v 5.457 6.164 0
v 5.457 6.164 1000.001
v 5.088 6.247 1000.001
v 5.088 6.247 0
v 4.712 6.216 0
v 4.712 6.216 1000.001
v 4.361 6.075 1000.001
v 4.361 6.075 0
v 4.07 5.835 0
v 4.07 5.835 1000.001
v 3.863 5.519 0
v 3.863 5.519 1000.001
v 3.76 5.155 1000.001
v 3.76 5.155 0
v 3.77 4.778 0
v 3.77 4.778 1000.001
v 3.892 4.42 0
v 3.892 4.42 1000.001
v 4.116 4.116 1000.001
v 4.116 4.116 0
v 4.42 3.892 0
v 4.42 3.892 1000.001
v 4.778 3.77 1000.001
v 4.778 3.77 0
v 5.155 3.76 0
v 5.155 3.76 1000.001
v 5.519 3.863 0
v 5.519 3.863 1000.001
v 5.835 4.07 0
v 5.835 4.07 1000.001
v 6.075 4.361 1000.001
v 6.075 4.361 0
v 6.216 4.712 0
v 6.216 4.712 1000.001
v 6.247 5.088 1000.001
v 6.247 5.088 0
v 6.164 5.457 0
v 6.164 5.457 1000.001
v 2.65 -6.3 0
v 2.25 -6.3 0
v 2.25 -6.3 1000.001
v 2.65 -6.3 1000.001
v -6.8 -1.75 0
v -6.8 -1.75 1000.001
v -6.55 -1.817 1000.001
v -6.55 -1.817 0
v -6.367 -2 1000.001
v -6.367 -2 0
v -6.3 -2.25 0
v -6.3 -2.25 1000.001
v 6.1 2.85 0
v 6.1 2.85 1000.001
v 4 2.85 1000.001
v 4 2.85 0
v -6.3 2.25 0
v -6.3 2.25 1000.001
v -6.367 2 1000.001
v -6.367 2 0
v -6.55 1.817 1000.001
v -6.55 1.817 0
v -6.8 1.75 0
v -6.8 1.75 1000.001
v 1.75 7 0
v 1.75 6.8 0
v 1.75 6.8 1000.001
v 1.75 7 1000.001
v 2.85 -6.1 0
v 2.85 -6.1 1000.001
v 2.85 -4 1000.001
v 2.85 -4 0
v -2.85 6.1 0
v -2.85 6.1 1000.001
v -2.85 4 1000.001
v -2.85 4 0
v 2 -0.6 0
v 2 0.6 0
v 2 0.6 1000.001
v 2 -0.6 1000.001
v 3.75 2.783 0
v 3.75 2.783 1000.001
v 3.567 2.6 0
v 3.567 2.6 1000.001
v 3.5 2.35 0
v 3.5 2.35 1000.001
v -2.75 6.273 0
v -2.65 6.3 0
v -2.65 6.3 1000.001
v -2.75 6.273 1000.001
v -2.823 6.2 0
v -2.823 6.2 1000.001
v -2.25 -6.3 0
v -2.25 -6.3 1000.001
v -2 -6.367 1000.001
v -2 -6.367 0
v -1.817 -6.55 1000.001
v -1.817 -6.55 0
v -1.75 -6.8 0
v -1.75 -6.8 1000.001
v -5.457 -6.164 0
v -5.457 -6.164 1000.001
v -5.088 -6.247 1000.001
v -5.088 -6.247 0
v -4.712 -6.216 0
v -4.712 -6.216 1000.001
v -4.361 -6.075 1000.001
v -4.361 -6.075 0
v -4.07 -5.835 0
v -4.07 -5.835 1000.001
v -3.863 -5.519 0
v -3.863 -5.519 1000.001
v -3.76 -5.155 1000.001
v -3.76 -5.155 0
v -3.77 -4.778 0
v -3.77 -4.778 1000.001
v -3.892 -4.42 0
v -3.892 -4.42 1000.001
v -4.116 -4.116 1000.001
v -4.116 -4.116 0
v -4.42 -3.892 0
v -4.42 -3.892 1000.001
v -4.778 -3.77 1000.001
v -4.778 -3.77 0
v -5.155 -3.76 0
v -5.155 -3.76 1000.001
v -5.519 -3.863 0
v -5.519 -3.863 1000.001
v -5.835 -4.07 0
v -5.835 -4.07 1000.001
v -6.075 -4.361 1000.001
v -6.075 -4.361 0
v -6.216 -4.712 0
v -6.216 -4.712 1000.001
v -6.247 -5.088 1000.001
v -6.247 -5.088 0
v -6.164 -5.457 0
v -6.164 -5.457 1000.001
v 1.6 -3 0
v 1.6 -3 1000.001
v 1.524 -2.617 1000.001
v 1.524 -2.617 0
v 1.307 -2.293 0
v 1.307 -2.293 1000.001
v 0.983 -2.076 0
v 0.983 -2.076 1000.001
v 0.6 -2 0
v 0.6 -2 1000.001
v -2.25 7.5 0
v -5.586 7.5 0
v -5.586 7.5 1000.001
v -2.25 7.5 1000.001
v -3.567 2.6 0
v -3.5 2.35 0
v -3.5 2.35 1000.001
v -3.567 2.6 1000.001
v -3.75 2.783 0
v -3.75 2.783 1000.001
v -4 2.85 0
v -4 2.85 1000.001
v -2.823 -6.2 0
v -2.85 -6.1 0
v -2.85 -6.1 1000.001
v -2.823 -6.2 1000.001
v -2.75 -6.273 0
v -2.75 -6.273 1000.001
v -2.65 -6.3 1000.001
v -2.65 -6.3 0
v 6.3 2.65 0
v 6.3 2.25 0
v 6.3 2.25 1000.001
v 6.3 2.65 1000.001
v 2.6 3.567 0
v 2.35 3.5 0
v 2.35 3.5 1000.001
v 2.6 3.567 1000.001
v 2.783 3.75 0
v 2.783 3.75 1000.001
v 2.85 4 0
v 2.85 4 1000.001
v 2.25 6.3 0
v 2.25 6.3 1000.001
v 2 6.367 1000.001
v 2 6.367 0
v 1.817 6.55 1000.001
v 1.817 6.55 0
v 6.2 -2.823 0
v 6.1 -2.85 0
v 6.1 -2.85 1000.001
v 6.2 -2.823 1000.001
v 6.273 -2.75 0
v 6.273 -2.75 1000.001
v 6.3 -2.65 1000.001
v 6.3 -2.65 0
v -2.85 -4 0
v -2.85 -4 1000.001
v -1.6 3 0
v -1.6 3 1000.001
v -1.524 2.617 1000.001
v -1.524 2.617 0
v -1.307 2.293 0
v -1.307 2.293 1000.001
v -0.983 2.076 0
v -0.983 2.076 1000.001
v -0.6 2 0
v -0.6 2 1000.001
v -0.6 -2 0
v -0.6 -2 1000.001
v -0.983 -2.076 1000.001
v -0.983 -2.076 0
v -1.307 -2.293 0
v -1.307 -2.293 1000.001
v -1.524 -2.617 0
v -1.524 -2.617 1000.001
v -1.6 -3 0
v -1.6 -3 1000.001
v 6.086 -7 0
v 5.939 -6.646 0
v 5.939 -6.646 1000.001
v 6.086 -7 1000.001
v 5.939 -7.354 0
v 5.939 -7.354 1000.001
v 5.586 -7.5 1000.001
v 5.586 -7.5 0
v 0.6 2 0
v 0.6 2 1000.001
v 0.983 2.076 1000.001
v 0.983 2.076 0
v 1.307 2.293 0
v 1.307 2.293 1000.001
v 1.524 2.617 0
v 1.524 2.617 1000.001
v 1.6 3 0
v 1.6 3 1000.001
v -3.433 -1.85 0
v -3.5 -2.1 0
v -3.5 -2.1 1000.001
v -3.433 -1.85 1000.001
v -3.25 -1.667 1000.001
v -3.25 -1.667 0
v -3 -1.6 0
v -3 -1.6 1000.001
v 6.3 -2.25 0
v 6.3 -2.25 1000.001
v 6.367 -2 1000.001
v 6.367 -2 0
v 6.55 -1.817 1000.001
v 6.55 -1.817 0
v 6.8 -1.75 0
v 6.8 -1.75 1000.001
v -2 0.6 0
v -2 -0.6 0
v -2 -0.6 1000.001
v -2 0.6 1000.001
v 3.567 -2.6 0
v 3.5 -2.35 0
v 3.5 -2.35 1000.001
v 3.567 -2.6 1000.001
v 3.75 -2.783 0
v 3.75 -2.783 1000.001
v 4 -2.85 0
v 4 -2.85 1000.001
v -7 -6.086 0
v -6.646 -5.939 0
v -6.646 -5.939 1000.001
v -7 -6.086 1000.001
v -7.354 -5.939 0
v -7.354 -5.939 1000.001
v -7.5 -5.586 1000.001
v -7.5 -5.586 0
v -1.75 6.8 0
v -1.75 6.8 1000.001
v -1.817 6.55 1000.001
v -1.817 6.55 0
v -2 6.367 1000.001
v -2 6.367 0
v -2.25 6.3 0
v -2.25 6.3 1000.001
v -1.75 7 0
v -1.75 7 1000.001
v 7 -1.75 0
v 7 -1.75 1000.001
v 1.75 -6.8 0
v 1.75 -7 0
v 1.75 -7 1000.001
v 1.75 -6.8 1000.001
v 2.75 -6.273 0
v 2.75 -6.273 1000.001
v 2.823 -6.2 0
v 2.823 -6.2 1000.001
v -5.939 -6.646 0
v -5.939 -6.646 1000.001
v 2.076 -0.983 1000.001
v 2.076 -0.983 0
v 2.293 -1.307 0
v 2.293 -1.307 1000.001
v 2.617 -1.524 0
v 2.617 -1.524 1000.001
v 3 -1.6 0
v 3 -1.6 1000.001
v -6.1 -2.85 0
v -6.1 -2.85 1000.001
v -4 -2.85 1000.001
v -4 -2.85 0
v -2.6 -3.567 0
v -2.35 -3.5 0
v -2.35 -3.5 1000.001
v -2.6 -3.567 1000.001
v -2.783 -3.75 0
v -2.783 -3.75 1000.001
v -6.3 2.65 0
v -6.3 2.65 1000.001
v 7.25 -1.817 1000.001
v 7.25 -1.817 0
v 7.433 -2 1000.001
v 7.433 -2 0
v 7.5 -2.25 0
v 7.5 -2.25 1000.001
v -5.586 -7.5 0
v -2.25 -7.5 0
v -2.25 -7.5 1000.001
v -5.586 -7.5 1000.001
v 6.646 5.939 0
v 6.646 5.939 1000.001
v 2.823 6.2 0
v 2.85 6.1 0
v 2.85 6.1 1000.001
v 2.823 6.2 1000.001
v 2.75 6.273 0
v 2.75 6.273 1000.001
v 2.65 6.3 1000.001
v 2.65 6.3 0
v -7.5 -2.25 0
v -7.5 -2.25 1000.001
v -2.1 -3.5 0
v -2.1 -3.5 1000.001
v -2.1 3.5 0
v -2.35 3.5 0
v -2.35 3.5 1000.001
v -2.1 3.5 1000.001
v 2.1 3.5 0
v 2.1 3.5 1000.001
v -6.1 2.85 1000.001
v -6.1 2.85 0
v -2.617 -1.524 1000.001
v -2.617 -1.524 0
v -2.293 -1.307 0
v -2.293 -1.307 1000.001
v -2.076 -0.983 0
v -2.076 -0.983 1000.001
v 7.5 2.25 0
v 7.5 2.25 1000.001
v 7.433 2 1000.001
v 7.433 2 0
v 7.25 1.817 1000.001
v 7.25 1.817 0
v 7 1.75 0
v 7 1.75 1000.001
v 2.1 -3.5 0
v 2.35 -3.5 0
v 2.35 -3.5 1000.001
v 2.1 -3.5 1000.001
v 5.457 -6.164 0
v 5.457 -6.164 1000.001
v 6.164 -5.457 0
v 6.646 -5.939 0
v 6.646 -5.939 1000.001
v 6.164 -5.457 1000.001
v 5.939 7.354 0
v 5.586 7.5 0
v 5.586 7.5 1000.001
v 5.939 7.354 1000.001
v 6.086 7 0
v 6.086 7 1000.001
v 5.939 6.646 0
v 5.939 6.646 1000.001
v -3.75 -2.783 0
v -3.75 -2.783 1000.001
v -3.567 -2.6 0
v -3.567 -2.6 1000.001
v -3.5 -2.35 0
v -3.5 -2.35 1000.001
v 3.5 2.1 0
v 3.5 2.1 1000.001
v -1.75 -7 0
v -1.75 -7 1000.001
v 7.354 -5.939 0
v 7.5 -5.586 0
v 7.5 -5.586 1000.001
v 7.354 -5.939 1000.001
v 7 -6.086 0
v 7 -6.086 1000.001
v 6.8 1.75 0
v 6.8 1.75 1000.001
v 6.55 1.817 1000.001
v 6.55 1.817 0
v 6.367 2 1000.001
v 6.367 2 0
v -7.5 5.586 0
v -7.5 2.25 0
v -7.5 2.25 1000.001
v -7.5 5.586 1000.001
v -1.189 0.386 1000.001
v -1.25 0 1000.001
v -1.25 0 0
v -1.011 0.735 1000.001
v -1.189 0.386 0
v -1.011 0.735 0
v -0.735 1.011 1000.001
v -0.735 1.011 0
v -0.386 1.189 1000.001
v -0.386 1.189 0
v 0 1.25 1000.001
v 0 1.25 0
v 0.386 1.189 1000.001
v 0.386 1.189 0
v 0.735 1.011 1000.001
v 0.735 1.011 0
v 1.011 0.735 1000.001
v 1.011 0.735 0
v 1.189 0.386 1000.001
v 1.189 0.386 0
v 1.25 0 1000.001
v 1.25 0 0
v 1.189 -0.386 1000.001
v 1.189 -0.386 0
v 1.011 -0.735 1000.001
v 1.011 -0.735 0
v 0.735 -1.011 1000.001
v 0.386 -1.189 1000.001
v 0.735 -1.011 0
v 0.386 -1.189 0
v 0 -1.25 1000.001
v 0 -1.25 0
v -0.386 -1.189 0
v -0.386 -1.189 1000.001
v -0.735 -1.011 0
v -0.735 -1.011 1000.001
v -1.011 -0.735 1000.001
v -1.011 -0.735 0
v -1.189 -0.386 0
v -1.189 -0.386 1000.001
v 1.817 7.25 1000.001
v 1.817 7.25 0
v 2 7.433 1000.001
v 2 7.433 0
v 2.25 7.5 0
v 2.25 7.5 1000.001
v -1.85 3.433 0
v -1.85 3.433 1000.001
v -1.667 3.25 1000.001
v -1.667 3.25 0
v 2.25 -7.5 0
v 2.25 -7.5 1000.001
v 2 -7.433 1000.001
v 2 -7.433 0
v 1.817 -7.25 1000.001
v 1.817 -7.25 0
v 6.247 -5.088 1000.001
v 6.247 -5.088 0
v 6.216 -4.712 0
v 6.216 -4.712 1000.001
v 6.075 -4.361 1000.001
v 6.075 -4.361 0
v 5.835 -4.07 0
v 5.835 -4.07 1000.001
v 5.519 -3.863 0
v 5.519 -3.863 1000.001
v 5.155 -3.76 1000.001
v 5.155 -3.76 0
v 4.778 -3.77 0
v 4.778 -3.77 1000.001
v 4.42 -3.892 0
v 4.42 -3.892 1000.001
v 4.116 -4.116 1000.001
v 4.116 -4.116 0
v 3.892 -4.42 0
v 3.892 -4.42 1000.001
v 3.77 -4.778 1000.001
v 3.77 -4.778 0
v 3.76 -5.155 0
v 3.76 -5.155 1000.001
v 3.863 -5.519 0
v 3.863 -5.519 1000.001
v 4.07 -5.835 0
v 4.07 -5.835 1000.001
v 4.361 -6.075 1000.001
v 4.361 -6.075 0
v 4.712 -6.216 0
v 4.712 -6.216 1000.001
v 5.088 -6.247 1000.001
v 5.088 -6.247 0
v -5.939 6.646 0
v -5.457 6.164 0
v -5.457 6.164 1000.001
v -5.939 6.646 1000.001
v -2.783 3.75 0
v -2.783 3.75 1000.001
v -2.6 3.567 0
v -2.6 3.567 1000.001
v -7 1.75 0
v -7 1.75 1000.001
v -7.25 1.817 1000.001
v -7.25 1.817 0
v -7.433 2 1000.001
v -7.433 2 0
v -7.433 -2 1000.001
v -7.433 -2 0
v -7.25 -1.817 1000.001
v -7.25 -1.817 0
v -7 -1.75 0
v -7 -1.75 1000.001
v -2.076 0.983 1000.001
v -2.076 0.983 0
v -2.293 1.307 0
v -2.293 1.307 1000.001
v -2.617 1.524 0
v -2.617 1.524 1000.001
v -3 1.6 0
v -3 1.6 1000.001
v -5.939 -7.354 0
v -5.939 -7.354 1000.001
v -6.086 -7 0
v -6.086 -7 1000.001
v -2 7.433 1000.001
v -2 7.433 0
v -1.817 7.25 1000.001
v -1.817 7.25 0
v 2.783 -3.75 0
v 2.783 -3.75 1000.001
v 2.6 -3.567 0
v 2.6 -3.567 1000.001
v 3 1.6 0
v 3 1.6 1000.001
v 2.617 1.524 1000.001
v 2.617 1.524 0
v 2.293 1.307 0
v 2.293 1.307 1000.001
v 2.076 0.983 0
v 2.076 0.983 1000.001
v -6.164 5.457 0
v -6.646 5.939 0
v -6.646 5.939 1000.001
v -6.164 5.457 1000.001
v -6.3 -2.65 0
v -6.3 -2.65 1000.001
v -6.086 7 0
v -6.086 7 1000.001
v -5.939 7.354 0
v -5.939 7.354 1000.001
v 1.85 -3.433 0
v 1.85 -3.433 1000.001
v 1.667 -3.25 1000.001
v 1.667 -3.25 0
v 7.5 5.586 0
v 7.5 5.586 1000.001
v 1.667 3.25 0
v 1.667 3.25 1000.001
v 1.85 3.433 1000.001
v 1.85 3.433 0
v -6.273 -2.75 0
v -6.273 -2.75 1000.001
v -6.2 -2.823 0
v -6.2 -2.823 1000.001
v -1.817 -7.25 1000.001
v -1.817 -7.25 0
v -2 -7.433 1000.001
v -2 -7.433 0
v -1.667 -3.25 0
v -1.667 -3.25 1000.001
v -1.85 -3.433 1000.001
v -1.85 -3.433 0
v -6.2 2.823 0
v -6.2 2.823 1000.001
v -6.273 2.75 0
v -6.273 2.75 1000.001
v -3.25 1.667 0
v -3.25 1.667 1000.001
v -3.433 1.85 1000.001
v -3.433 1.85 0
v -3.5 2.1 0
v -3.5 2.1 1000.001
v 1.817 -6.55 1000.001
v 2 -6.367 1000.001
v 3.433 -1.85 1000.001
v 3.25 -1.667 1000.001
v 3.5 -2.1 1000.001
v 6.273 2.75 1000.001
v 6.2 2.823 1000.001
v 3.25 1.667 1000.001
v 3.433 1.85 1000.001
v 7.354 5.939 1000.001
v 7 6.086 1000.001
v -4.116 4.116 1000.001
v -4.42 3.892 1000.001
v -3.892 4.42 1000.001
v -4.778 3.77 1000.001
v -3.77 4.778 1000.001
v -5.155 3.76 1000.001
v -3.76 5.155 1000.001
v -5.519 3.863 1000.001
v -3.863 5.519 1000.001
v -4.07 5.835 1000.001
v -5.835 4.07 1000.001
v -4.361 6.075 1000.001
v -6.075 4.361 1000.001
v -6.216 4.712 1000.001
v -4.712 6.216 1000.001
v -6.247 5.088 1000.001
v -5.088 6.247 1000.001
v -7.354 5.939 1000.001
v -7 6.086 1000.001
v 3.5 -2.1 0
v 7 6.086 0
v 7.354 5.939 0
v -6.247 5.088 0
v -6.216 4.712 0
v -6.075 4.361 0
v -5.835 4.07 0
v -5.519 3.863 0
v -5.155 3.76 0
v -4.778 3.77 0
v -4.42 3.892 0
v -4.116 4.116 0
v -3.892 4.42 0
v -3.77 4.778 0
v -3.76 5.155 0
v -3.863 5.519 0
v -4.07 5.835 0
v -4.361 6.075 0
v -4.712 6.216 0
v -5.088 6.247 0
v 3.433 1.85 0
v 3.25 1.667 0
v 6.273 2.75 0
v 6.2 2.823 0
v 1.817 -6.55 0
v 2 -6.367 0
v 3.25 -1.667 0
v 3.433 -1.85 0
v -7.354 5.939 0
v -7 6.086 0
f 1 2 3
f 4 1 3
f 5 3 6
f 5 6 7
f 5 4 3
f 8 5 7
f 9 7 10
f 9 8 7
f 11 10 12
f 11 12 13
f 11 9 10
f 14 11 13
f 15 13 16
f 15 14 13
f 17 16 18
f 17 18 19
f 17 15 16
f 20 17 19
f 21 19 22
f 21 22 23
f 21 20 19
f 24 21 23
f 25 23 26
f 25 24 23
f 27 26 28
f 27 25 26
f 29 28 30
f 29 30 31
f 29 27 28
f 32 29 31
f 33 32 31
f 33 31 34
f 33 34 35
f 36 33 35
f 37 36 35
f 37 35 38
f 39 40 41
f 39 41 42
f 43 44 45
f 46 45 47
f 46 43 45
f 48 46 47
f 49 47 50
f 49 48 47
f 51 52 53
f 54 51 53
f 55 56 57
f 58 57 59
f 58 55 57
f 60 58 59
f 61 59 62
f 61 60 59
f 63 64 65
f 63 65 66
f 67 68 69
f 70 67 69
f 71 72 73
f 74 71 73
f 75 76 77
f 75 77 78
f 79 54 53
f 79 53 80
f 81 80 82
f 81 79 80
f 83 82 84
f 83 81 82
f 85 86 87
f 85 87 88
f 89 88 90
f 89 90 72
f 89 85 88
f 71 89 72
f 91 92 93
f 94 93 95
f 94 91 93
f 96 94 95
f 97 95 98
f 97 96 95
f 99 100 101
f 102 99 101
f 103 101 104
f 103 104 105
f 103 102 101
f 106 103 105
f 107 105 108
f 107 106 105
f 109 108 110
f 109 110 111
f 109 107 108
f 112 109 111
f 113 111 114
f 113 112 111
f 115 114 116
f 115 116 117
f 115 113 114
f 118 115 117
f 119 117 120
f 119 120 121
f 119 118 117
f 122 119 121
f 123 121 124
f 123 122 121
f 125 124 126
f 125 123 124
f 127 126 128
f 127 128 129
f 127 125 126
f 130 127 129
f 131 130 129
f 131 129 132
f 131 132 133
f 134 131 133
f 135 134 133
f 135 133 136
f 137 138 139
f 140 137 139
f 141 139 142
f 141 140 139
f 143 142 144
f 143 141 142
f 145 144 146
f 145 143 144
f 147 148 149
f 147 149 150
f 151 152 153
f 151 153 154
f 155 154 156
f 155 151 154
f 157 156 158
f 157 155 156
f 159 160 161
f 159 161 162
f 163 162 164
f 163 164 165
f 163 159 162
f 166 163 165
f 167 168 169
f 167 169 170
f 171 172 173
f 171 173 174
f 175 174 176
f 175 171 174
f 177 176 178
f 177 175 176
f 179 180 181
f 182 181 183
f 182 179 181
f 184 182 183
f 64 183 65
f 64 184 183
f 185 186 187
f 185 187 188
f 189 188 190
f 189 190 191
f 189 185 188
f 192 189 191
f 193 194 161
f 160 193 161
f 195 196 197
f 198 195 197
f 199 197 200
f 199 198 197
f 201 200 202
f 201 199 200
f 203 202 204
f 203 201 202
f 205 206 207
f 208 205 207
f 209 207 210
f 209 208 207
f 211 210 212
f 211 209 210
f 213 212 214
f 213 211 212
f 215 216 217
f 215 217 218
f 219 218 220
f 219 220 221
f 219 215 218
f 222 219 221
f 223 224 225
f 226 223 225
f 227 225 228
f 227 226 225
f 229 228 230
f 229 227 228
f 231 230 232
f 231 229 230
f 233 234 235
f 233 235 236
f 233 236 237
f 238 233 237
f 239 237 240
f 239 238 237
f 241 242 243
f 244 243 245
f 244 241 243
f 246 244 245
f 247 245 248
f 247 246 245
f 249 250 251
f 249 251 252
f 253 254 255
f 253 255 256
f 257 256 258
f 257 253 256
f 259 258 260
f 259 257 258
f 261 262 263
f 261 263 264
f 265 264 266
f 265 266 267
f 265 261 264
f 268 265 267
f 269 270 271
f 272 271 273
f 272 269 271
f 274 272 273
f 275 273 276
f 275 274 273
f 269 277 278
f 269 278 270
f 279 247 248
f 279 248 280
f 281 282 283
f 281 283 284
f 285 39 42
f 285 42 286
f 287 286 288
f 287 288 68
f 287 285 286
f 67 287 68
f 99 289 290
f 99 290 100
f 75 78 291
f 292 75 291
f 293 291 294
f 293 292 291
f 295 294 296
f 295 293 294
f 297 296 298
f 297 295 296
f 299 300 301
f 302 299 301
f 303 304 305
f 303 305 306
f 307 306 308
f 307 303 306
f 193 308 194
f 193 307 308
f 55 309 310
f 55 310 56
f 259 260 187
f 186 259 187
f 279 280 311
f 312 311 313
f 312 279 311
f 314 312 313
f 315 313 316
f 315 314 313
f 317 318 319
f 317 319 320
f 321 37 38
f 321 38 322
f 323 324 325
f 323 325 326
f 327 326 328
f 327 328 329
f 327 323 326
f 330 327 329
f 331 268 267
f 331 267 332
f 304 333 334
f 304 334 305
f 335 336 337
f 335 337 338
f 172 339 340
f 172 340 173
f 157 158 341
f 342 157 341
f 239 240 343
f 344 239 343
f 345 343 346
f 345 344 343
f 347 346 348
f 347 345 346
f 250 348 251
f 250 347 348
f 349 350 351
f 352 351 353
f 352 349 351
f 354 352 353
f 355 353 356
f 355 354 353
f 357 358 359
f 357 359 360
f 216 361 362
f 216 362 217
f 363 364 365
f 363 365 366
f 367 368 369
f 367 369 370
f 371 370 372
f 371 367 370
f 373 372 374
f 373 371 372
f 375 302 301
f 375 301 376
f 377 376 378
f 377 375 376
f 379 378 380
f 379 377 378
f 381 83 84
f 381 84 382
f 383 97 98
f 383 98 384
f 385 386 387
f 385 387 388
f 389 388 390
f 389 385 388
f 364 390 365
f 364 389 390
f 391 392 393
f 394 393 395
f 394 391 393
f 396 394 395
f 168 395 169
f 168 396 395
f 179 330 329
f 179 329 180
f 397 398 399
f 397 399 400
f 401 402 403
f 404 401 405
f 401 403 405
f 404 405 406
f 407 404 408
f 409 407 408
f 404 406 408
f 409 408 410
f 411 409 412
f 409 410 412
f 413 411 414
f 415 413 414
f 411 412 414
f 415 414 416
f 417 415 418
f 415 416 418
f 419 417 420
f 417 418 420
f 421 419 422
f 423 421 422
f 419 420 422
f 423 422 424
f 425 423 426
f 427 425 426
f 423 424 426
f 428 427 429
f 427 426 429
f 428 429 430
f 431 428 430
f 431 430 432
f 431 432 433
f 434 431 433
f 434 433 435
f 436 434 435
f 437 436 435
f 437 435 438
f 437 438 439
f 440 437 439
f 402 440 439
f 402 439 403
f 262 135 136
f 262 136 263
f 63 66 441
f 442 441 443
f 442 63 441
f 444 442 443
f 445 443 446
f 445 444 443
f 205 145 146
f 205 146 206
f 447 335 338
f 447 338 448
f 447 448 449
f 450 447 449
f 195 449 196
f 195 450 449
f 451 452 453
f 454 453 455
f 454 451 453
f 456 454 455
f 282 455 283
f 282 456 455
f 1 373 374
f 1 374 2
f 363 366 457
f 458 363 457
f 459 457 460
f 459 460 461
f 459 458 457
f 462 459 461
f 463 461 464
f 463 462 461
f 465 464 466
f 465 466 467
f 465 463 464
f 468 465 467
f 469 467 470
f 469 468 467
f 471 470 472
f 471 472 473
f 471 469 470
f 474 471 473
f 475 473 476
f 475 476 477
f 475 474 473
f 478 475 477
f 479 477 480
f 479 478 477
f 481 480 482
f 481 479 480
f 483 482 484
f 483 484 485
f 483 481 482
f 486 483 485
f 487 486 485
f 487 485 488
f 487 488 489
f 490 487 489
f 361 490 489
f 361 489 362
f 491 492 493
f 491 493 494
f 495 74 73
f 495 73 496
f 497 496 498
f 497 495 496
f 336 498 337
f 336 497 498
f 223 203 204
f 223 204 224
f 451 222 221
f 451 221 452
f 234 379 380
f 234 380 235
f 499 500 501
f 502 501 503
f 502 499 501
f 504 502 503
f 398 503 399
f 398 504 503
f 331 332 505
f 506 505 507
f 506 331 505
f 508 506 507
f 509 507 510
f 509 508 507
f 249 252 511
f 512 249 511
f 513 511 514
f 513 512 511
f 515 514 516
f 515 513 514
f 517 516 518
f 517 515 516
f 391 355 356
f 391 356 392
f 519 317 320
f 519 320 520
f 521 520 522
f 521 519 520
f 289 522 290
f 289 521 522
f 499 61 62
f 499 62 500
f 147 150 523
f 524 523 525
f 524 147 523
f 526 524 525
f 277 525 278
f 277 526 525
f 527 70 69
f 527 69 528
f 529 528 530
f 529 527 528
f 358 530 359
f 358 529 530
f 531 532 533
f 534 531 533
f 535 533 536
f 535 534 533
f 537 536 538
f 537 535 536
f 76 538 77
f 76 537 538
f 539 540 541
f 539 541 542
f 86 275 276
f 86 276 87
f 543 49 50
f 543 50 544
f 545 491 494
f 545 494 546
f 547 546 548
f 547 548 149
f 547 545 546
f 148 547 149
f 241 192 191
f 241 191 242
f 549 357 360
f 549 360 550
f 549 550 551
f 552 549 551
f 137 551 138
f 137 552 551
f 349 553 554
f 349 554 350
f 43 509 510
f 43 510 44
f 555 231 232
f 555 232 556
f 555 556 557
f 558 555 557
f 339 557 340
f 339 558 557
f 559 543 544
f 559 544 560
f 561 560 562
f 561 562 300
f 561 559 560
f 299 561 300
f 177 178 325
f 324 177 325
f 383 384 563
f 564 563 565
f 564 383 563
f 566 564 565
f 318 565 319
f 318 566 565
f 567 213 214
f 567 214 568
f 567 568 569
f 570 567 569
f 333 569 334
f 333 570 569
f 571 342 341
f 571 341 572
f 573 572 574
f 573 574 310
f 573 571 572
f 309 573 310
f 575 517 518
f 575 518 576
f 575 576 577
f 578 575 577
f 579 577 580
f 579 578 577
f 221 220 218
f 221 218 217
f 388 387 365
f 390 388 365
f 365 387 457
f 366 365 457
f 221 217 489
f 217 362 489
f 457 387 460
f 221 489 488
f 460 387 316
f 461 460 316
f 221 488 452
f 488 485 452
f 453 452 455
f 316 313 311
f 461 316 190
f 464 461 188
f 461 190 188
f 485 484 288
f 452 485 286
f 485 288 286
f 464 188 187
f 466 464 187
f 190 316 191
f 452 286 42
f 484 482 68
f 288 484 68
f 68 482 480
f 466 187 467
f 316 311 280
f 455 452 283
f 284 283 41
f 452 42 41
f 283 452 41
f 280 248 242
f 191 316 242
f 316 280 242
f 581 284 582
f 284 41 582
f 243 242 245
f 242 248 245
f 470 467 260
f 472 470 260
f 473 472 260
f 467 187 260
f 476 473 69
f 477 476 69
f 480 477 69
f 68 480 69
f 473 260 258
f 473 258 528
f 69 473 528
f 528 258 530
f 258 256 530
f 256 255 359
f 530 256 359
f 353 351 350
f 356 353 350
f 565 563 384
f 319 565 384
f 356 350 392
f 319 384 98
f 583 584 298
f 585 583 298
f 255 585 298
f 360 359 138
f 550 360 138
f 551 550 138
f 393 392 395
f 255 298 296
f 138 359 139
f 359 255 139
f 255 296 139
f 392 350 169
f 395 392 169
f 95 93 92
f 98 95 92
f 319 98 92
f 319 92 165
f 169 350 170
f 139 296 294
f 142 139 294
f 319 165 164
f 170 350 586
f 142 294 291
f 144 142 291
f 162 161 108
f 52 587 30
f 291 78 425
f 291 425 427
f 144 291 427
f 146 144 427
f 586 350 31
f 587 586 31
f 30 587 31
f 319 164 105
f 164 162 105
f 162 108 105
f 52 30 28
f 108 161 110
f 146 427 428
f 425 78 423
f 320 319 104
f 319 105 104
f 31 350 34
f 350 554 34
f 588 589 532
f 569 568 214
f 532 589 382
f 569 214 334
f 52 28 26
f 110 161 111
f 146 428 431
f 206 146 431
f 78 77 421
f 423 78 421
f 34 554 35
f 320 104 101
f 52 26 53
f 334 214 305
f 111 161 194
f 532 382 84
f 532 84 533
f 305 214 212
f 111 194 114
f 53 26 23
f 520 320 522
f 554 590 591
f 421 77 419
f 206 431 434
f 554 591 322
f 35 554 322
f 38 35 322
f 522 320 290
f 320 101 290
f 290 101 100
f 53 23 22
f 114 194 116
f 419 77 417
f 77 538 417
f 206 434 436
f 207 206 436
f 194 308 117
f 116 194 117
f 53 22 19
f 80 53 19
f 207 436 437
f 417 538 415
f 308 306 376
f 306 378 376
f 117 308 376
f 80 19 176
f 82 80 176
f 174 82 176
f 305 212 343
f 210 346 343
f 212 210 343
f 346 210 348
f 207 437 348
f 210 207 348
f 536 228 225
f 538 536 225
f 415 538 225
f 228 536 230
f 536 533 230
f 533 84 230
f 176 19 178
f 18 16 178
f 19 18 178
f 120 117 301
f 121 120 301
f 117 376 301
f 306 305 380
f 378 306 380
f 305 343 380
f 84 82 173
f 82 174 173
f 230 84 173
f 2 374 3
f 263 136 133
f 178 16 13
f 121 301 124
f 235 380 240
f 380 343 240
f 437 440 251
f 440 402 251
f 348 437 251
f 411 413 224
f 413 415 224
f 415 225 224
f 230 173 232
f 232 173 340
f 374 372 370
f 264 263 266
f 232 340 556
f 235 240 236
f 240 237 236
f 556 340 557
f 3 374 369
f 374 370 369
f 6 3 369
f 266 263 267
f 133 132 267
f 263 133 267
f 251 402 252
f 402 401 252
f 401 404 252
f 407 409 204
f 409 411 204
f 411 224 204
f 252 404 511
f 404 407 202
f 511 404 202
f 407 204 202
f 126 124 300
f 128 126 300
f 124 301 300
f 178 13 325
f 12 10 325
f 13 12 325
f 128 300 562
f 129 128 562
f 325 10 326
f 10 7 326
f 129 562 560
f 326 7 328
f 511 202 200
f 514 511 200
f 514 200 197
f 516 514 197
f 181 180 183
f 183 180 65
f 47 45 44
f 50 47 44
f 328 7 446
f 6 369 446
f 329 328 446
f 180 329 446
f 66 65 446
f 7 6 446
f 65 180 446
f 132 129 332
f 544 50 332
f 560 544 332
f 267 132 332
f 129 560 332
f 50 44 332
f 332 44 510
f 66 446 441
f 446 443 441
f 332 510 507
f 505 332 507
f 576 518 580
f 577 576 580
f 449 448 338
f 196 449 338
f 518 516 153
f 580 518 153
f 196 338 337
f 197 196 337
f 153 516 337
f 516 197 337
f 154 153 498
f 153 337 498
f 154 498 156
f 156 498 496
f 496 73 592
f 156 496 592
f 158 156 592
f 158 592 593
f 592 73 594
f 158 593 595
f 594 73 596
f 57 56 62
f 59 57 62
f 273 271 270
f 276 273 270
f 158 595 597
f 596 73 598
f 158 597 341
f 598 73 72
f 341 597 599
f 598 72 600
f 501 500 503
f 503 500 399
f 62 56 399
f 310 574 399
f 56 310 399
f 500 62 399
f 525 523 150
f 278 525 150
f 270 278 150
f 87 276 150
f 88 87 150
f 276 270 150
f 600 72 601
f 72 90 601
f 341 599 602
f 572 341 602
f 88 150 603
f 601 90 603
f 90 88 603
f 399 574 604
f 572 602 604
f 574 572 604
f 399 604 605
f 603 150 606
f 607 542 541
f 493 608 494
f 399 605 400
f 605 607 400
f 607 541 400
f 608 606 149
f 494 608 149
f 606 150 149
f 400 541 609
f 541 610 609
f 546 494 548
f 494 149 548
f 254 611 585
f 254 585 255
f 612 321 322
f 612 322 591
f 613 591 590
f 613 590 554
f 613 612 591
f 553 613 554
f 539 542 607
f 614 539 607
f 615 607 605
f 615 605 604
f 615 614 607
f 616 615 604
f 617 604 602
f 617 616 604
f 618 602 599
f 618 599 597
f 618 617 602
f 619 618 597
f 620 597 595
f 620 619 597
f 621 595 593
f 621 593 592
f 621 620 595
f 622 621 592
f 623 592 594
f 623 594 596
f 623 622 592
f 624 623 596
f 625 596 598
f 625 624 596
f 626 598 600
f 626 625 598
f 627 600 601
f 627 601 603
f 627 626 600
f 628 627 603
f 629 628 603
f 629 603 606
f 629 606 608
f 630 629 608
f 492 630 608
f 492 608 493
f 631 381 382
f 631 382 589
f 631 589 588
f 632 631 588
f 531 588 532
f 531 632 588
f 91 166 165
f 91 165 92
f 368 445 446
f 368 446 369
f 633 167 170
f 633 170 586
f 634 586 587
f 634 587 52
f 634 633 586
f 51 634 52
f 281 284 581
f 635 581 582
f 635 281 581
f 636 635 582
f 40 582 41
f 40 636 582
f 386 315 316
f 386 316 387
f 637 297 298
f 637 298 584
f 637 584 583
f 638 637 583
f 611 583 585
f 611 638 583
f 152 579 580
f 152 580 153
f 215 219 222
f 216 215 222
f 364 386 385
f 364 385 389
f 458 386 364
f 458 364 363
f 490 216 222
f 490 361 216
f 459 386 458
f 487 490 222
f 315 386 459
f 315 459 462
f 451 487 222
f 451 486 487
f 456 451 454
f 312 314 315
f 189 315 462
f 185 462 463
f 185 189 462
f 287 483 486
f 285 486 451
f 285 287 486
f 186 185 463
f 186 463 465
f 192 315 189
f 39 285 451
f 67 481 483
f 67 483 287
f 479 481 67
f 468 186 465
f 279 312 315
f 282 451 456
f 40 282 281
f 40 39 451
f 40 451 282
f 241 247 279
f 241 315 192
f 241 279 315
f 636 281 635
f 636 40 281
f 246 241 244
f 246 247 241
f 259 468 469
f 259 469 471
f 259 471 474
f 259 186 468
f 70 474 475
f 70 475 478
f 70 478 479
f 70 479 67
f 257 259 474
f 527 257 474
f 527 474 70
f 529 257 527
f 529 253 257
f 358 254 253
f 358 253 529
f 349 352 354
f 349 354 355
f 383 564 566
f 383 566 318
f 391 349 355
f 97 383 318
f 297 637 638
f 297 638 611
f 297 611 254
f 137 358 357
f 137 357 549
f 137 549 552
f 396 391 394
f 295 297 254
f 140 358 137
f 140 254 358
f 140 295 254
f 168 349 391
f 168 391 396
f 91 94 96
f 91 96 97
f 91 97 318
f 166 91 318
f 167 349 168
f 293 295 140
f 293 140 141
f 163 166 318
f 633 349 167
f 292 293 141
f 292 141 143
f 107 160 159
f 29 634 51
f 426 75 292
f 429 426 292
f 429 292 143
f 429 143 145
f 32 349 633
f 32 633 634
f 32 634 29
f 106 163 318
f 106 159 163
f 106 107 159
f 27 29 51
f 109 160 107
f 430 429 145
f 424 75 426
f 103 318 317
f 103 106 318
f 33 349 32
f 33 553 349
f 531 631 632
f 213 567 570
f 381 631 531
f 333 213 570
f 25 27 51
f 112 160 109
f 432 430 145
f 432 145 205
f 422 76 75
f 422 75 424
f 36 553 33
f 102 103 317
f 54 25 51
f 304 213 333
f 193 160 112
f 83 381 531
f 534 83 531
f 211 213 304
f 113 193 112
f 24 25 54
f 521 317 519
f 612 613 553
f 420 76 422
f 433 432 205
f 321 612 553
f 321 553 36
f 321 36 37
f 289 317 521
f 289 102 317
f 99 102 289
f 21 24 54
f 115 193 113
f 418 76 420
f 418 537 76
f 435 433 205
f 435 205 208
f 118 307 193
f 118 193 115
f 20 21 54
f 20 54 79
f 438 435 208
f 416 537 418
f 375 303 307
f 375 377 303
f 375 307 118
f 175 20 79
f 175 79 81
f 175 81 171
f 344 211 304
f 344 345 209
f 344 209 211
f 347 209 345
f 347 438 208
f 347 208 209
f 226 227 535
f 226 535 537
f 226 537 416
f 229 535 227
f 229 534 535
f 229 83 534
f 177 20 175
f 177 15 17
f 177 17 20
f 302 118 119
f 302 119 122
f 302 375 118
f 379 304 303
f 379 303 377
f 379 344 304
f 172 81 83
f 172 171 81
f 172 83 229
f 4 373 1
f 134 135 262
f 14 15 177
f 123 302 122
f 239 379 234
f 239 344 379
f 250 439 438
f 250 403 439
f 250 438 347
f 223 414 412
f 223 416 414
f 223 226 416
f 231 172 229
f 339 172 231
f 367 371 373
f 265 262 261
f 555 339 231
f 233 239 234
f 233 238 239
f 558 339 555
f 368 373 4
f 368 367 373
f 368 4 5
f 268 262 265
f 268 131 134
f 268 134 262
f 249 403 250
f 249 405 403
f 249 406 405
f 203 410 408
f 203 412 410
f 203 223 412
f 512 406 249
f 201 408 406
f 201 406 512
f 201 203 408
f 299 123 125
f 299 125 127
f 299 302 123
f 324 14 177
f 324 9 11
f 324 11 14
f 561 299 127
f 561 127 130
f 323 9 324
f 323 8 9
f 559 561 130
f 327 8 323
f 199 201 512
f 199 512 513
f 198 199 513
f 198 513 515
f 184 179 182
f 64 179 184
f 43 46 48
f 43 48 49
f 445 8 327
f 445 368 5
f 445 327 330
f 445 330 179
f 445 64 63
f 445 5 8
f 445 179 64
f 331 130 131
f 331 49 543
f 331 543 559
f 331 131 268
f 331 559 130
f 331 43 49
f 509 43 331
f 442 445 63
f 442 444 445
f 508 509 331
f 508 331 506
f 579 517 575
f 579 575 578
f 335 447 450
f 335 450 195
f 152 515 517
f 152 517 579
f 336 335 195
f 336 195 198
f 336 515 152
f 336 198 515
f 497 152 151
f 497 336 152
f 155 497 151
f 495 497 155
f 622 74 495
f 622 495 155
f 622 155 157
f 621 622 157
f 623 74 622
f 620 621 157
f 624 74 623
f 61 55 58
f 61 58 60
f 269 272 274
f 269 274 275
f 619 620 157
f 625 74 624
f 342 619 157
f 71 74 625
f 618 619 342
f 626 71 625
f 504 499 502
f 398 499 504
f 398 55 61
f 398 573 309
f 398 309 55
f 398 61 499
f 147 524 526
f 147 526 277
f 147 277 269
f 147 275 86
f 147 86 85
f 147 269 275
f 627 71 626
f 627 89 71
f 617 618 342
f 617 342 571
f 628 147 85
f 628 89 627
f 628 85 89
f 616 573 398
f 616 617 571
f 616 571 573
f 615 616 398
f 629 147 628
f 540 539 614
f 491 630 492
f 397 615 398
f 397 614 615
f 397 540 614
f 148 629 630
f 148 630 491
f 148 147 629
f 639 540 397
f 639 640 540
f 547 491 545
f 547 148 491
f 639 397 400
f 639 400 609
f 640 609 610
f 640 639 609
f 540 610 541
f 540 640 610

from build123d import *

# Parameters (mm, degrees)
SKETCH1_R    = 1.25
LENGTH_DEPTH = 1000.00054


with BuildPart() as part:
    # Sketch1 → Length (new body)
    with BuildSketch(Plane(origin=(0, 0, 0), x_dir=(-1, 0, 0), z_dir=(0, 0, -1))):
        with BuildLine():
            Line((6.646446609, 5.939339828), (6.163645978, 5.456539197))
            ThreePointArc((6.163645978, 5.456539197), (4.116116524, 4.116116524), (5.456539197, 6.163645978))
            Line((5.456539197, 6.163645978), (5.939339828, 6.646446609))
            ThreePointArc((5.939339828, 6.646446609), (6.047726204, 7.191341716), (5.585786438, 7.5))
            Line((5.585786438, 7.5), (2.25, 7.5))
            ThreePointArc((2.25, 7.5), (1.896446609, 7.353553391), (1.75, 7))
            Line((1.75, 7), (1.75, 6.8))
            ThreePointArc((1.75, 6.8), (1.896446609, 6.446446609), (2.25, 6.3))
            Line((2.25, 6.3), (2.65, 6.3))
            ThreePointArc((2.65, 6.3), (2.791421356, 6.241421356), (2.85, 6.1))
            Line((2.85, 6.1), (2.85, 4))
            ThreePointArc((2.85, 4), (2.703553391, 3.646446609), (2.35, 3.5))
            Line((2.35, 3.5), (2.1, 3.5))
            ThreePointArc((2.1, 3.5), (1.746446609, 3.353553391), (1.6, 3))
            ThreePointArc((1.6, 3), (1.307106781, 2.292893219), (0.6, 2))
            Line((0.6, 2), (-0.6, 2))
            ThreePointArc((-0.6, 2), (-1.307106781, 2.292893219), (-1.6, 3))
            ThreePointArc((-1.6, 3), (-1.746446609, 3.353553391), (-2.1, 3.5))
            Line((-2.1, 3.5), (-2.35, 3.5))
            ThreePointArc((-2.35, 3.5), (-2.703553391, 3.646446609), (-2.85, 4))
            Line((-2.85, 4), (-2.85, 6.1))
            ThreePointArc((-2.85, 6.1), (-2.791421356, 6.241421356), (-2.65, 6.3))
            Line((-2.65, 6.3), (-2.25, 6.3))
            ThreePointArc((-2.25, 6.3), (-1.896446609, 6.446446609), (-1.75, 6.8))
            Line((-1.75, 6.8), (-1.75, 7))
            ThreePointArc((-1.75, 7), (-1.896446609, 7.353553391), (-2.25, 7.5))
            Line((-2.25, 7.5), (-5.585786438, 7.5))
            ThreePointArc((-5.585786438, 7.5), (-6.047726204, 7.191341716), (-5.939339828, 6.646446609))
            Line((-5.939339828, 6.646446609), (-5.456539197, 6.163645978))
            ThreePointArc((-5.456539197, 6.163645978), (-4.116116524, 4.116116524), (-6.163645978, 5.456539197))
            Line((-6.163645978, 5.456539197), (-6.646446609, 5.939339828))
            ThreePointArc((-6.646446609, 5.939339828), (-7.191341716, 6.047726204), (-7.5, 5.585786438))
            Line((-7.5, 5.585786438), (-7.5, 2.25))
            ThreePointArc((-7.5, 2.25), (-7.353553391, 1.896446609), (-7, 1.75))
            Line((-7, 1.75), (-6.8, 1.75))
            ThreePointArc((-6.8, 1.75), (-6.446446609, 1.896446609), (-6.3, 2.25))
            Line((-6.3, 2.25), (-6.3, 2.65))
            ThreePointArc((-6.3, 2.65), (-6.241421356, 2.791421356), (-6.1, 2.85))
            Line((-6.1, 2.85), (-4, 2.85))
            ThreePointArc((-4, 2.85), (-3.646446609, 2.703553391), (-3.5, 2.35))
            Line((-3.5, 2.35), (-3.5, 2.1))
            ThreePointArc((-3.5, 2.1), (-3.353553391, 1.746446609), (-3, 1.6))
            ThreePointArc((-3, 1.6), (-2.292893219, 1.307106781), (-2, 0.6))
            Line((-2, 0.6), (-2, -0.6))
            ThreePointArc((-2, -0.6), (-2.292893219, -1.307106781), (-3, -1.6))
            ThreePointArc((-3, -1.6), (-3.353553391, -1.746446609), (-3.5, -2.1))
            Line((-3.5, -2.1), (-3.5, -2.35))
            ThreePointArc((-3.5, -2.35), (-3.646446609, -2.703553391), (-4, -2.85))
            Line((-4, -2.85), (-6.1, -2.85))
            ThreePointArc((-6.1, -2.85), (-6.241421356, -2.791421356), (-6.3, -2.65))
            Line((-6.3, -2.65), (-6.3, -2.25))
            ThreePointArc((-6.3, -2.25), (-6.446446609, -1.896446609), (-6.8, -1.75))
            Line((-6.8, -1.75), (-7, -1.75))
            ThreePointArc((-7, -1.75), (-7.353553391, -1.896446609), (-7.5, -2.25))
            Line((-7.5, -2.25), (-7.5, -5.585786438))
            ThreePointArc((-7.5, -5.585786438), (-7.191341716, -6.047726204), (-6.646446609, -5.939339828))
            Line((-6.646446609, -5.939339828), (-6.163645978, -5.456539197))
            ThreePointArc((-6.163645978, -5.456539197), (-4.116116524, -4.116116524), (-5.456539197, -6.163645978))
            Line((-5.456539197, -6.163645978), (-5.939339828, -6.646446609))
            ThreePointArc((-5.939339828, -6.646446609), (-6.047726204, -7.191341716), (-5.585786438, -7.5))
            Line((-5.585786438, -7.5), (-2.25, -7.5))
            ThreePointArc((-2.25, -7.5), (-1.896446609, -7.353553391), (-1.75, -7))
            Line((-1.75, -7), (-1.75, -6.8))
            ThreePointArc((-1.75, -6.8), (-1.896446609, -6.446446609), (-2.25, -6.3))
            Line((-2.25, -6.3), (-2.65, -6.3))
            ThreePointArc((-2.65, -6.3), (-2.791421356, -6.241421356), (-2.85, -6.1))
            Line((-2.85, -6.1), (-2.85, -4))
            ThreePointArc((-2.85, -4), (-2.703553391, -3.646446609), (-2.35, -3.5))
            Line((-2.35, -3.5), (-2.1, -3.5))
            ThreePointArc((-2.1, -3.5), (-1.746446609, -3.353553391), (-1.6, -3))
            ThreePointArc((-1.6, -3), (-1.307106781, -2.292893219), (-0.6, -2))
            Line((-0.6, -2), (0.6, -2))
            ThreePointArc((0.6, -2), (1.307106781, -2.292893219), (1.6, -3))
            ThreePointArc((1.6, -3), (1.746446609, -3.353553391), (2.1, -3.5))
            Line((2.1, -3.5), (2.35, -3.5))
            ThreePointArc((2.35, -3.5), (2.703553391, -3.646446609), (2.85, -4))
            Line((2.85, -4), (2.85, -6.1))
            ThreePointArc((2.85, -6.1), (2.791421356, -6.241421356), (2.65, -6.3))
            Line((2.65, -6.3), (2.25, -6.3))
            ThreePointArc((2.25, -6.3), (1.896446609, -6.446446609), (1.75, -6.8))
            Line((1.75, -6.8), (1.75, -7))
            ThreePointArc((1.75, -7), (1.896446609, -7.353553391), (2.25, -7.5))
            Line((2.25, -7.5), (5.585786438, -7.5))
            ThreePointArc((5.585786438, -7.5), (6.047726204, -7.191341716), (5.939339828, -6.646446609))
            Line((5.939339828, -6.646446609), (5.456539197, -6.163645978))
            ThreePointArc((5.456539197, -6.163645978), (4.116116524, -4.116116524), (6.163645978, -5.456539197))
            Line((6.163645978, -5.456539197), (6.646446609, -5.939339828))
            ThreePointArc((6.646446609, -5.939339828), (7.191341716, -6.047726204), (7.5, -5.585786438))
            Line((7.5, -5.585786438), (7.5, -2.25))
            ThreePointArc((7.5, -2.25), (7.353553391, -1.896446609), (7, -1.75))
            Line((7, -1.75), (6.8, -1.75))
            ThreePointArc((6.8, -1.75), (6.446446609, -1.896446609), (6.3, -2.25))
            Line((6.3, -2.25), (6.3, -2.65))
            ThreePointArc((6.3, -2.65), (6.241421356, -2.791421356), (6.1, -2.85))
            Line((6.1, -2.85), (4, -2.85))
            ThreePointArc((4, -2.85), (3.646446609, -2.703553391), (3.5, -2.35))
            Line((3.5, -2.35), (3.5, -2.1))
            ThreePointArc((3.5, -2.1), (3.353553391, -1.746446609), (3, -1.6))
            ThreePointArc((3, -1.6), (2.292893219, -1.307106781), (2, -0.6))
            Line((2, -0.6), (2, 0.6))
            ThreePointArc((2, 0.6), (2.292893219, 1.307106781), (3, 1.6))
            ThreePointArc((3, 1.6), (3.353553391, 1.746446609), (3.5, 2.1))
            Line((3.5, 2.1), (3.5, 2.35))
            ThreePointArc((3.5, 2.35), (3.646446609, 2.703553391), (4, 2.85))
            Line((4, 2.85), (6.1, 2.85))
            ThreePointArc((6.1, 2.85), (6.241421356, 2.791421356), (6.3, 2.65))
            Line((6.3, 2.65), (6.3, 2.25))
            ThreePointArc((6.3, 2.25), (6.446446609, 1.896446609), (6.8, 1.75))
            Line((6.8, 1.75), (7, 1.75))
            ThreePointArc((7, 1.75), (7.353553391, 1.896446609), (7.5, 2.25))
            Line((7.5, 2.25), (7.5, 5.585786438))
            ThreePointArc((7.5, 5.585786438), (7.191341716, 6.047726204), (6.646446609, 5.939339828))
        make_face()
        Circle(SKETCH1_R, mode=Mode.SUBTRACT)
    extrude(amount=-LENGTH_DEPTH)


solid = part.part
